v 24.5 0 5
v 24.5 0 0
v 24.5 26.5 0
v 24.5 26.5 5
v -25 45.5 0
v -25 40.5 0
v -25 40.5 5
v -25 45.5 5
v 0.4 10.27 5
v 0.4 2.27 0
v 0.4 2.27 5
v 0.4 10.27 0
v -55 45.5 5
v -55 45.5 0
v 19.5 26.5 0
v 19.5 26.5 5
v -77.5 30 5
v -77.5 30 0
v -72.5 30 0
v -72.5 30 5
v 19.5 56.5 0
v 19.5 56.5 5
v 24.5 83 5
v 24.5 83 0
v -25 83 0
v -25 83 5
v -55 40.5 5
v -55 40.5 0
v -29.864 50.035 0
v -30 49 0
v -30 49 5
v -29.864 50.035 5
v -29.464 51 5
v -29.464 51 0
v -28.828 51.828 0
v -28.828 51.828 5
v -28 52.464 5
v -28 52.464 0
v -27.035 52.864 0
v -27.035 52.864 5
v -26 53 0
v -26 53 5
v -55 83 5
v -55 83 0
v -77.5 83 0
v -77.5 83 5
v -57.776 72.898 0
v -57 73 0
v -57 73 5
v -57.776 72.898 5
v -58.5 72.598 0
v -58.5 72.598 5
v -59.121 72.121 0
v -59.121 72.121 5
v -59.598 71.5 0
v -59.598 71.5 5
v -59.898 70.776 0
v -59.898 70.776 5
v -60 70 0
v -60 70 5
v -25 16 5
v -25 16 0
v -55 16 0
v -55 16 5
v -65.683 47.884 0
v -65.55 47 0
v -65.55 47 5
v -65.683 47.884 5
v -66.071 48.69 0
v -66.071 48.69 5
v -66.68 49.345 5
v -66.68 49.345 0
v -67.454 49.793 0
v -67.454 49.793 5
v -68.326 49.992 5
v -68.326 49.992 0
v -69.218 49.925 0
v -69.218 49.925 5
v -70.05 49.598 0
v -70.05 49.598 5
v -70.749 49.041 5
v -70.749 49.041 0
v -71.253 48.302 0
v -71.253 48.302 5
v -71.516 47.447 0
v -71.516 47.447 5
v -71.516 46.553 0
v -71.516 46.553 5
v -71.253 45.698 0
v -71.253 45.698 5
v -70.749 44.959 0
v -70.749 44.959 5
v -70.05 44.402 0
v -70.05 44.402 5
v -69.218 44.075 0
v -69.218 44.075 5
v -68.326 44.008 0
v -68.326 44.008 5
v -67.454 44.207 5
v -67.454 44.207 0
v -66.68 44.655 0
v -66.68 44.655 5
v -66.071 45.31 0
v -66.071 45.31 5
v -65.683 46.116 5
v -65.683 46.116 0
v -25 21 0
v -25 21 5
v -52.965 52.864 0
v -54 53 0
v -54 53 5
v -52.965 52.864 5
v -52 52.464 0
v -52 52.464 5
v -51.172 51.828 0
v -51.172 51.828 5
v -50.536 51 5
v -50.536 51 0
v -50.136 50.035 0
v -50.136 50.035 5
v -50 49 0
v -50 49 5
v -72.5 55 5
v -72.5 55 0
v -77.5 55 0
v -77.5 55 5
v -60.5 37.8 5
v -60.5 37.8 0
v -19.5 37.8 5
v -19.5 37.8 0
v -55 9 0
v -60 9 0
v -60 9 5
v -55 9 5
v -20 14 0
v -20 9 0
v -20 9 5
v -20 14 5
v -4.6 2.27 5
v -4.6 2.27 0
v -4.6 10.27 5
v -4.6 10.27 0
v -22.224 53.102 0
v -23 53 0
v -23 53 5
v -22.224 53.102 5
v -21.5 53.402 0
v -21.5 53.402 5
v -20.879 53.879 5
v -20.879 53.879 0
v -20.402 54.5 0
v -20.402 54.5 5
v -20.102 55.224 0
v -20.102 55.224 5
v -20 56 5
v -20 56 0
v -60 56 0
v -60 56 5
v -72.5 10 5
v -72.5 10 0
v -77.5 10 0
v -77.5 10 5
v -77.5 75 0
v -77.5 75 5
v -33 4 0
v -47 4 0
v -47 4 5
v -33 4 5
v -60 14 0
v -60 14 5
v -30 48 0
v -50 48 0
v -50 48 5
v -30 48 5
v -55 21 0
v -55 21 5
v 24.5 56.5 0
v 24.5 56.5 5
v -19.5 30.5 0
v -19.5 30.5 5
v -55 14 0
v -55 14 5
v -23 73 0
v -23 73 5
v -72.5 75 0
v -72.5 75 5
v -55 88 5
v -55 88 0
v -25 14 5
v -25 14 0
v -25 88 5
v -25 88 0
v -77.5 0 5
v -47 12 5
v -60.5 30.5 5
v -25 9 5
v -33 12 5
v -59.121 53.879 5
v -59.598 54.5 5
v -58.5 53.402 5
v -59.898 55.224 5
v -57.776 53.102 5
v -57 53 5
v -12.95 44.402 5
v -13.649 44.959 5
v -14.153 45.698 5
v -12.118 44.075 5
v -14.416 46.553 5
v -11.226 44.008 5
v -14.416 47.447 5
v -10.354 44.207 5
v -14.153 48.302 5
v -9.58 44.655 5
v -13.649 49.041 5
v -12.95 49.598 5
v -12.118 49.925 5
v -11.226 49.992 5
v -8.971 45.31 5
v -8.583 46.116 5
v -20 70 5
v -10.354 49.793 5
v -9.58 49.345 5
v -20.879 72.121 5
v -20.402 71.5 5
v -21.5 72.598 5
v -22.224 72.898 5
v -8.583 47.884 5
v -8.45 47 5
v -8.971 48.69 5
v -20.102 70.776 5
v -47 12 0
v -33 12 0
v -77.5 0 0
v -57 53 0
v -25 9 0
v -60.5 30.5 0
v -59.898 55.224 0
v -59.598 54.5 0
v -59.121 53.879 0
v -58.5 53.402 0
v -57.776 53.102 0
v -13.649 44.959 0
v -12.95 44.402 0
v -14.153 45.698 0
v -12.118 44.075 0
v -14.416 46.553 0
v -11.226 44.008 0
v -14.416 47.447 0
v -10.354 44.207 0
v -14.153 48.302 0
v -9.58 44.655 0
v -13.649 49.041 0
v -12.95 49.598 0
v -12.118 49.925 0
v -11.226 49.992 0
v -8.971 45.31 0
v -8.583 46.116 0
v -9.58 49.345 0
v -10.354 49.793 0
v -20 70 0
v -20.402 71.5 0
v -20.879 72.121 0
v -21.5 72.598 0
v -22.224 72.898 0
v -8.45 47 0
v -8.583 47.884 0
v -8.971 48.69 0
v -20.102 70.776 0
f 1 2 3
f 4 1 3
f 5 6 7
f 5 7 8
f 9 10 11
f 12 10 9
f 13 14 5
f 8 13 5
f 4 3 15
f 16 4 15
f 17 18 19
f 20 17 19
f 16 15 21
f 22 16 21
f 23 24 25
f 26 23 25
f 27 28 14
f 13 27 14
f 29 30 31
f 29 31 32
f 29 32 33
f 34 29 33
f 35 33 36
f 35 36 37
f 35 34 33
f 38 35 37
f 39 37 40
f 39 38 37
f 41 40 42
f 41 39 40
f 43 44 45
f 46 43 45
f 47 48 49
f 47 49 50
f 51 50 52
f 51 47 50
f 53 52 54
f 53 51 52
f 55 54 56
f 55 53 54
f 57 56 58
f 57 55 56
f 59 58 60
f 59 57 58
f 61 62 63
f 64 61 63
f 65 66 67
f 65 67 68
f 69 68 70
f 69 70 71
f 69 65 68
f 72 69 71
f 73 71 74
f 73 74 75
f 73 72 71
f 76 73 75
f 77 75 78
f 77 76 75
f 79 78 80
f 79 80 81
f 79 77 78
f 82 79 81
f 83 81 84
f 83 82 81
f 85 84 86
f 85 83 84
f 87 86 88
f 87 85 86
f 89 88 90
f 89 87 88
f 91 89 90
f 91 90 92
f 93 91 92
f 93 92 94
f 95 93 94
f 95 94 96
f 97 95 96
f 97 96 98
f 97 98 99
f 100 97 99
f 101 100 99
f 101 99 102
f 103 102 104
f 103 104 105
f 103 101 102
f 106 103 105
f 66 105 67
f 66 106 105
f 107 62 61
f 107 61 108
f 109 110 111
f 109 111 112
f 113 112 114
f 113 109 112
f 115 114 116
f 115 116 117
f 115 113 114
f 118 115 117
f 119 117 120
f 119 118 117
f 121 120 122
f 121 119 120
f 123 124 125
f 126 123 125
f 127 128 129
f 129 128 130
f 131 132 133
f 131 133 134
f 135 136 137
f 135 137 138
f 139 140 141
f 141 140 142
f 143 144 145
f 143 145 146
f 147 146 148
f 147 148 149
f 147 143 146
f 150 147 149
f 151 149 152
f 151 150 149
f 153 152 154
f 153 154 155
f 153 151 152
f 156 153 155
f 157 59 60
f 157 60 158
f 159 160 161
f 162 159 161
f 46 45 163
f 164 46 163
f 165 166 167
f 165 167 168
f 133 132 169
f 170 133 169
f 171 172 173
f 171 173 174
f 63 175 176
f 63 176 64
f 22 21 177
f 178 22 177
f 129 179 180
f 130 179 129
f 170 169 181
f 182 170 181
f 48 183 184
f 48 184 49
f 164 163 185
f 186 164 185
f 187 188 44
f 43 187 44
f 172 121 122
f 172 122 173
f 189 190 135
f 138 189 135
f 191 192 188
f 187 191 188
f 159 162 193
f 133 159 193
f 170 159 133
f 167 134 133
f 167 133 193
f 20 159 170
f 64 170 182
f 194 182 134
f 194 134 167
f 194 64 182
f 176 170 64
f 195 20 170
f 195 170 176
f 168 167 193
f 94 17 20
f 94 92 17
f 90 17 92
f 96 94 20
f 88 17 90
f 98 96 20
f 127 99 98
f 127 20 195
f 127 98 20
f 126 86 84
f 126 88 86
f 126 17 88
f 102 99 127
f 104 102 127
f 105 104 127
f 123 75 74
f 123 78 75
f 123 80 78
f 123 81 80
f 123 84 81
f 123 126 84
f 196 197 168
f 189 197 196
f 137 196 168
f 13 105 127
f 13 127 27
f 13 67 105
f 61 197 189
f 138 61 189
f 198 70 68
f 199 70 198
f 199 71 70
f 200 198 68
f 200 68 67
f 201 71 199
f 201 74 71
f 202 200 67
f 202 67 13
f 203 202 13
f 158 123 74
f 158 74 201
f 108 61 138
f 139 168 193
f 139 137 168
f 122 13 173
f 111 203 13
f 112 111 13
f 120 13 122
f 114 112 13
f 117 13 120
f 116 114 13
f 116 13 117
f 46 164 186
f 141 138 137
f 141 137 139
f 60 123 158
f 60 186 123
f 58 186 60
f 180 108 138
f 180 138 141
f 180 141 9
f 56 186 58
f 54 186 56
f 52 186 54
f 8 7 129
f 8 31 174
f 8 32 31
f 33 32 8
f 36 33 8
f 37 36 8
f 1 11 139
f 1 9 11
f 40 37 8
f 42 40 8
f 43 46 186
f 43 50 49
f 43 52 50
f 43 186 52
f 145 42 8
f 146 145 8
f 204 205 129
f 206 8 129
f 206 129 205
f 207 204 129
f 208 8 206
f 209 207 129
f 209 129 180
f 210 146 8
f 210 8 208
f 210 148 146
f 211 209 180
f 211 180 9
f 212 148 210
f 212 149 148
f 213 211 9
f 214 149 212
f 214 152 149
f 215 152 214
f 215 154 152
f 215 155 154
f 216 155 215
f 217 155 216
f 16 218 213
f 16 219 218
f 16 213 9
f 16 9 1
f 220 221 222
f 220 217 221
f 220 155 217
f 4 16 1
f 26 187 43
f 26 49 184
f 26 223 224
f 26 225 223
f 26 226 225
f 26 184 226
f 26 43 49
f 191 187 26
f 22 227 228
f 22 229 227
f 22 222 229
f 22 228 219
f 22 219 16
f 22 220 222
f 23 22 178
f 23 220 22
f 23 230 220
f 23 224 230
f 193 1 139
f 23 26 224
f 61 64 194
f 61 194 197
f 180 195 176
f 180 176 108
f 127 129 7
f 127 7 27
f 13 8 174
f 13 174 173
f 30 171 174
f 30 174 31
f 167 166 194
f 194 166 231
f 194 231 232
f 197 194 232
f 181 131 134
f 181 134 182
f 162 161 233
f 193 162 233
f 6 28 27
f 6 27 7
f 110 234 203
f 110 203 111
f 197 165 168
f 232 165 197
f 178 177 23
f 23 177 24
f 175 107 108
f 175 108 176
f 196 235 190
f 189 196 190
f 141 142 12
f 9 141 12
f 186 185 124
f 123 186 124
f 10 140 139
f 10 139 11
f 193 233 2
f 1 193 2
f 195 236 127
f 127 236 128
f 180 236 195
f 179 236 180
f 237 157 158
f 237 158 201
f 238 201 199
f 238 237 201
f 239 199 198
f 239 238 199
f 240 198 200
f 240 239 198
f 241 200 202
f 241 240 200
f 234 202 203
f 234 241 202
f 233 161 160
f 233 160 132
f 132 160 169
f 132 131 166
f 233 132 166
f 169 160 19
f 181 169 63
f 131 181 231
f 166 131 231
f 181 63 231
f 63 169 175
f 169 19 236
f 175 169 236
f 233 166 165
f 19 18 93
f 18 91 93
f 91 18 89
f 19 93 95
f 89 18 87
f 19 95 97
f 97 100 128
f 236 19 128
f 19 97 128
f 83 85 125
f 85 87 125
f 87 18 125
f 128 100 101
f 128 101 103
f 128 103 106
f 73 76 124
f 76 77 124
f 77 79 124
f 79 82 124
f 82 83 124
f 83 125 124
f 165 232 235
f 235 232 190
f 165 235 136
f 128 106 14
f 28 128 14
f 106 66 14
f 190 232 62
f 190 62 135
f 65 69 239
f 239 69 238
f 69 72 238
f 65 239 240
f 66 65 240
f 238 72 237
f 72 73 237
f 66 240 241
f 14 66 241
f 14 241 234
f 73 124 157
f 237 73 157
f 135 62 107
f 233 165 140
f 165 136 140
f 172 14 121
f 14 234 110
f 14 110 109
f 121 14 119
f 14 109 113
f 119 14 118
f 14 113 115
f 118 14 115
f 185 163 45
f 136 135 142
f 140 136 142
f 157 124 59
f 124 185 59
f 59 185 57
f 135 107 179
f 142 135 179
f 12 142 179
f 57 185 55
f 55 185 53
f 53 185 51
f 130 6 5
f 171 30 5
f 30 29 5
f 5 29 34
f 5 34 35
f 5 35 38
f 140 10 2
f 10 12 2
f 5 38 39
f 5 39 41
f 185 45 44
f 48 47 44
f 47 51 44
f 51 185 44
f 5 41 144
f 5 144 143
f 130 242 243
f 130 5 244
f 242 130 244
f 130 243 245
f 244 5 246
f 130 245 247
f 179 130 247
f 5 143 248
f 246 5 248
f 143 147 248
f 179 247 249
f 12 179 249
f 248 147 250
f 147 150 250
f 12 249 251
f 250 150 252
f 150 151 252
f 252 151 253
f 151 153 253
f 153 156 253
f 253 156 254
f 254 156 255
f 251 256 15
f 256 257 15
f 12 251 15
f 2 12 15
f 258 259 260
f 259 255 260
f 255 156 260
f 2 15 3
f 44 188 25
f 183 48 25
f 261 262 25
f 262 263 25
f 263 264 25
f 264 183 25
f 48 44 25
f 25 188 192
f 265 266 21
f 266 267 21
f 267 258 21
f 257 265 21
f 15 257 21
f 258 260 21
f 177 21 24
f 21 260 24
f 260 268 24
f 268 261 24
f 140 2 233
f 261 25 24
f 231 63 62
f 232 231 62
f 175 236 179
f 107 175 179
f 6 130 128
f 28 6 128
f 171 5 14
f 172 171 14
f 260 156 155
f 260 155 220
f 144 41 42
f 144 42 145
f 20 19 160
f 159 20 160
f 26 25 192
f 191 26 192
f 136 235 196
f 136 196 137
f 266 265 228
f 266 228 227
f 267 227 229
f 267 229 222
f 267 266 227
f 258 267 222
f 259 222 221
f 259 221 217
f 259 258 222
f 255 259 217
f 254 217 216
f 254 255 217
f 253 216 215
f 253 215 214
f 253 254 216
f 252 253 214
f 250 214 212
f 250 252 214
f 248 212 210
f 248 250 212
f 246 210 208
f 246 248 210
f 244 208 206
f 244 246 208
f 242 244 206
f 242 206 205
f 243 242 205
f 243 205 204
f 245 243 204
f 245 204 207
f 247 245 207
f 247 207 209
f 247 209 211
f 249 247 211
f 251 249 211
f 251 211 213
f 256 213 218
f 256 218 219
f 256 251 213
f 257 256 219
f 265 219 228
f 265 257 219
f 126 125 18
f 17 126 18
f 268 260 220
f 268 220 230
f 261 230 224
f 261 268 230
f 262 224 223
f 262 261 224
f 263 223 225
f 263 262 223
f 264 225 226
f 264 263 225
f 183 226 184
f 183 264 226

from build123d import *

# Parameters (mm, degrees)
SKETCH_1_R      = 3
SKETCH_1_W      = 30
SKETCH_1_H      = 5
SKETCH_1_W_2    = 5
SKETCH_1_W_3    = 14
SKETCH_1_H_2    = 8
SKETCH_1_W_4    = 41
SKETCH_1_H_3    = 7.3
EXTRUDE_1_DEPTH = 5


with BuildPart() as part:
    # 草图1 → 凸台-拉伸1 (new body)
    with BuildSketch(Plane.XY):
        Polygon((-77.5, 0), (24.5, 0), (24.5, 26.5), (19.5, 26.5), (19.5, 56.5), (24.5, 56.5), (24.5, 83), (-25, 83), (-25, 88), (-55, 88), (-55, 83), (-77.5, 83), (-77.5, 75), (-72.5, 75), (-72.5, 55), (-77.5, 55), (-77.5, 30), (-72.5, 30), (-72.5, 10), (-77.5, 10), align=None)
        with Locations((-68.55, 47)):
            Circle(SKETCH_1_R, mode=Mode.SUBTRACT)
        with Locations((-11.45, 47)):
            Circle(SKETCH_1_R, mode=Mode.SUBTRACT)
        with BuildLine():
            Line((-57, 53), (-54, 53))
            ThreePointArc((-54, 53), (-51.171572875, 51.828427125), (-50, 49))
            Line((-50, 49), (-50, 48))
            Line((-50, 48), (-30, 48))
            Line((-30, 48), (-30, 49))
            ThreePointArc((-30, 49), (-28.828427125, 51.828427125), (-26, 53))
            Line((-26, 53), (-23, 53))
            ThreePointArc((-23, 53), (-20.878679656, 53.878679656), (-20, 56))
            Line((-20, 56), (-20, 70))
            ThreePointArc((-20, 70), (-20.878679656, 72.121320344), (-23, 73))
            Line((-23, 73), (-57, 73))
            ThreePointArc((-57, 73), (-59.121320344, 72.121320344), (-60, 70))
            Line((-60, 70), (-60, 56))
            ThreePointArc((-60, 56), (-59.121320344, 53.878679656), (-57, 53))
        make_face(mode=Mode.SUBTRACT)
        with Locations((-40, 43)):
            Rectangle(SKETCH_1_W, SKETCH_1_H, mode=Mode.SUBTRACT)
        Polygon((-55, 16), (-50, 16), (-30, 16), (-25, 16), (-25, 21), (-55, 21), align=None, mode=Mode.SUBTRACT)
        with Locations((-57.5, 11.5)):
            Rectangle(SKETCH_1_W_2, SKETCH_1_H, mode=Mode.SUBTRACT)
        with Locations((-22.5, 11.5)):
            Rectangle(SKETCH_1_W_2, SKETCH_1_H, mode=Mode.SUBTRACT)
        with Locations((-40, 8)):
            Rectangle(SKETCH_1_W_3, SKETCH_1_H_2, mode=Mode.SUBTRACT)
        with Locations((-40, 34.15)):
            Rectangle(SKETCH_1_W_4, SKETCH_1_H_3, mode=Mode.SUBTRACT)
        with Locations((-2.1, 6.27)):
            Rectangle(SKETCH_1_W_2, SKETCH_1_H_2, mode=Mode.SUBTRACT)
    extrude(amount=EXTRUDE_1_DEPTH)


solid = part.part
